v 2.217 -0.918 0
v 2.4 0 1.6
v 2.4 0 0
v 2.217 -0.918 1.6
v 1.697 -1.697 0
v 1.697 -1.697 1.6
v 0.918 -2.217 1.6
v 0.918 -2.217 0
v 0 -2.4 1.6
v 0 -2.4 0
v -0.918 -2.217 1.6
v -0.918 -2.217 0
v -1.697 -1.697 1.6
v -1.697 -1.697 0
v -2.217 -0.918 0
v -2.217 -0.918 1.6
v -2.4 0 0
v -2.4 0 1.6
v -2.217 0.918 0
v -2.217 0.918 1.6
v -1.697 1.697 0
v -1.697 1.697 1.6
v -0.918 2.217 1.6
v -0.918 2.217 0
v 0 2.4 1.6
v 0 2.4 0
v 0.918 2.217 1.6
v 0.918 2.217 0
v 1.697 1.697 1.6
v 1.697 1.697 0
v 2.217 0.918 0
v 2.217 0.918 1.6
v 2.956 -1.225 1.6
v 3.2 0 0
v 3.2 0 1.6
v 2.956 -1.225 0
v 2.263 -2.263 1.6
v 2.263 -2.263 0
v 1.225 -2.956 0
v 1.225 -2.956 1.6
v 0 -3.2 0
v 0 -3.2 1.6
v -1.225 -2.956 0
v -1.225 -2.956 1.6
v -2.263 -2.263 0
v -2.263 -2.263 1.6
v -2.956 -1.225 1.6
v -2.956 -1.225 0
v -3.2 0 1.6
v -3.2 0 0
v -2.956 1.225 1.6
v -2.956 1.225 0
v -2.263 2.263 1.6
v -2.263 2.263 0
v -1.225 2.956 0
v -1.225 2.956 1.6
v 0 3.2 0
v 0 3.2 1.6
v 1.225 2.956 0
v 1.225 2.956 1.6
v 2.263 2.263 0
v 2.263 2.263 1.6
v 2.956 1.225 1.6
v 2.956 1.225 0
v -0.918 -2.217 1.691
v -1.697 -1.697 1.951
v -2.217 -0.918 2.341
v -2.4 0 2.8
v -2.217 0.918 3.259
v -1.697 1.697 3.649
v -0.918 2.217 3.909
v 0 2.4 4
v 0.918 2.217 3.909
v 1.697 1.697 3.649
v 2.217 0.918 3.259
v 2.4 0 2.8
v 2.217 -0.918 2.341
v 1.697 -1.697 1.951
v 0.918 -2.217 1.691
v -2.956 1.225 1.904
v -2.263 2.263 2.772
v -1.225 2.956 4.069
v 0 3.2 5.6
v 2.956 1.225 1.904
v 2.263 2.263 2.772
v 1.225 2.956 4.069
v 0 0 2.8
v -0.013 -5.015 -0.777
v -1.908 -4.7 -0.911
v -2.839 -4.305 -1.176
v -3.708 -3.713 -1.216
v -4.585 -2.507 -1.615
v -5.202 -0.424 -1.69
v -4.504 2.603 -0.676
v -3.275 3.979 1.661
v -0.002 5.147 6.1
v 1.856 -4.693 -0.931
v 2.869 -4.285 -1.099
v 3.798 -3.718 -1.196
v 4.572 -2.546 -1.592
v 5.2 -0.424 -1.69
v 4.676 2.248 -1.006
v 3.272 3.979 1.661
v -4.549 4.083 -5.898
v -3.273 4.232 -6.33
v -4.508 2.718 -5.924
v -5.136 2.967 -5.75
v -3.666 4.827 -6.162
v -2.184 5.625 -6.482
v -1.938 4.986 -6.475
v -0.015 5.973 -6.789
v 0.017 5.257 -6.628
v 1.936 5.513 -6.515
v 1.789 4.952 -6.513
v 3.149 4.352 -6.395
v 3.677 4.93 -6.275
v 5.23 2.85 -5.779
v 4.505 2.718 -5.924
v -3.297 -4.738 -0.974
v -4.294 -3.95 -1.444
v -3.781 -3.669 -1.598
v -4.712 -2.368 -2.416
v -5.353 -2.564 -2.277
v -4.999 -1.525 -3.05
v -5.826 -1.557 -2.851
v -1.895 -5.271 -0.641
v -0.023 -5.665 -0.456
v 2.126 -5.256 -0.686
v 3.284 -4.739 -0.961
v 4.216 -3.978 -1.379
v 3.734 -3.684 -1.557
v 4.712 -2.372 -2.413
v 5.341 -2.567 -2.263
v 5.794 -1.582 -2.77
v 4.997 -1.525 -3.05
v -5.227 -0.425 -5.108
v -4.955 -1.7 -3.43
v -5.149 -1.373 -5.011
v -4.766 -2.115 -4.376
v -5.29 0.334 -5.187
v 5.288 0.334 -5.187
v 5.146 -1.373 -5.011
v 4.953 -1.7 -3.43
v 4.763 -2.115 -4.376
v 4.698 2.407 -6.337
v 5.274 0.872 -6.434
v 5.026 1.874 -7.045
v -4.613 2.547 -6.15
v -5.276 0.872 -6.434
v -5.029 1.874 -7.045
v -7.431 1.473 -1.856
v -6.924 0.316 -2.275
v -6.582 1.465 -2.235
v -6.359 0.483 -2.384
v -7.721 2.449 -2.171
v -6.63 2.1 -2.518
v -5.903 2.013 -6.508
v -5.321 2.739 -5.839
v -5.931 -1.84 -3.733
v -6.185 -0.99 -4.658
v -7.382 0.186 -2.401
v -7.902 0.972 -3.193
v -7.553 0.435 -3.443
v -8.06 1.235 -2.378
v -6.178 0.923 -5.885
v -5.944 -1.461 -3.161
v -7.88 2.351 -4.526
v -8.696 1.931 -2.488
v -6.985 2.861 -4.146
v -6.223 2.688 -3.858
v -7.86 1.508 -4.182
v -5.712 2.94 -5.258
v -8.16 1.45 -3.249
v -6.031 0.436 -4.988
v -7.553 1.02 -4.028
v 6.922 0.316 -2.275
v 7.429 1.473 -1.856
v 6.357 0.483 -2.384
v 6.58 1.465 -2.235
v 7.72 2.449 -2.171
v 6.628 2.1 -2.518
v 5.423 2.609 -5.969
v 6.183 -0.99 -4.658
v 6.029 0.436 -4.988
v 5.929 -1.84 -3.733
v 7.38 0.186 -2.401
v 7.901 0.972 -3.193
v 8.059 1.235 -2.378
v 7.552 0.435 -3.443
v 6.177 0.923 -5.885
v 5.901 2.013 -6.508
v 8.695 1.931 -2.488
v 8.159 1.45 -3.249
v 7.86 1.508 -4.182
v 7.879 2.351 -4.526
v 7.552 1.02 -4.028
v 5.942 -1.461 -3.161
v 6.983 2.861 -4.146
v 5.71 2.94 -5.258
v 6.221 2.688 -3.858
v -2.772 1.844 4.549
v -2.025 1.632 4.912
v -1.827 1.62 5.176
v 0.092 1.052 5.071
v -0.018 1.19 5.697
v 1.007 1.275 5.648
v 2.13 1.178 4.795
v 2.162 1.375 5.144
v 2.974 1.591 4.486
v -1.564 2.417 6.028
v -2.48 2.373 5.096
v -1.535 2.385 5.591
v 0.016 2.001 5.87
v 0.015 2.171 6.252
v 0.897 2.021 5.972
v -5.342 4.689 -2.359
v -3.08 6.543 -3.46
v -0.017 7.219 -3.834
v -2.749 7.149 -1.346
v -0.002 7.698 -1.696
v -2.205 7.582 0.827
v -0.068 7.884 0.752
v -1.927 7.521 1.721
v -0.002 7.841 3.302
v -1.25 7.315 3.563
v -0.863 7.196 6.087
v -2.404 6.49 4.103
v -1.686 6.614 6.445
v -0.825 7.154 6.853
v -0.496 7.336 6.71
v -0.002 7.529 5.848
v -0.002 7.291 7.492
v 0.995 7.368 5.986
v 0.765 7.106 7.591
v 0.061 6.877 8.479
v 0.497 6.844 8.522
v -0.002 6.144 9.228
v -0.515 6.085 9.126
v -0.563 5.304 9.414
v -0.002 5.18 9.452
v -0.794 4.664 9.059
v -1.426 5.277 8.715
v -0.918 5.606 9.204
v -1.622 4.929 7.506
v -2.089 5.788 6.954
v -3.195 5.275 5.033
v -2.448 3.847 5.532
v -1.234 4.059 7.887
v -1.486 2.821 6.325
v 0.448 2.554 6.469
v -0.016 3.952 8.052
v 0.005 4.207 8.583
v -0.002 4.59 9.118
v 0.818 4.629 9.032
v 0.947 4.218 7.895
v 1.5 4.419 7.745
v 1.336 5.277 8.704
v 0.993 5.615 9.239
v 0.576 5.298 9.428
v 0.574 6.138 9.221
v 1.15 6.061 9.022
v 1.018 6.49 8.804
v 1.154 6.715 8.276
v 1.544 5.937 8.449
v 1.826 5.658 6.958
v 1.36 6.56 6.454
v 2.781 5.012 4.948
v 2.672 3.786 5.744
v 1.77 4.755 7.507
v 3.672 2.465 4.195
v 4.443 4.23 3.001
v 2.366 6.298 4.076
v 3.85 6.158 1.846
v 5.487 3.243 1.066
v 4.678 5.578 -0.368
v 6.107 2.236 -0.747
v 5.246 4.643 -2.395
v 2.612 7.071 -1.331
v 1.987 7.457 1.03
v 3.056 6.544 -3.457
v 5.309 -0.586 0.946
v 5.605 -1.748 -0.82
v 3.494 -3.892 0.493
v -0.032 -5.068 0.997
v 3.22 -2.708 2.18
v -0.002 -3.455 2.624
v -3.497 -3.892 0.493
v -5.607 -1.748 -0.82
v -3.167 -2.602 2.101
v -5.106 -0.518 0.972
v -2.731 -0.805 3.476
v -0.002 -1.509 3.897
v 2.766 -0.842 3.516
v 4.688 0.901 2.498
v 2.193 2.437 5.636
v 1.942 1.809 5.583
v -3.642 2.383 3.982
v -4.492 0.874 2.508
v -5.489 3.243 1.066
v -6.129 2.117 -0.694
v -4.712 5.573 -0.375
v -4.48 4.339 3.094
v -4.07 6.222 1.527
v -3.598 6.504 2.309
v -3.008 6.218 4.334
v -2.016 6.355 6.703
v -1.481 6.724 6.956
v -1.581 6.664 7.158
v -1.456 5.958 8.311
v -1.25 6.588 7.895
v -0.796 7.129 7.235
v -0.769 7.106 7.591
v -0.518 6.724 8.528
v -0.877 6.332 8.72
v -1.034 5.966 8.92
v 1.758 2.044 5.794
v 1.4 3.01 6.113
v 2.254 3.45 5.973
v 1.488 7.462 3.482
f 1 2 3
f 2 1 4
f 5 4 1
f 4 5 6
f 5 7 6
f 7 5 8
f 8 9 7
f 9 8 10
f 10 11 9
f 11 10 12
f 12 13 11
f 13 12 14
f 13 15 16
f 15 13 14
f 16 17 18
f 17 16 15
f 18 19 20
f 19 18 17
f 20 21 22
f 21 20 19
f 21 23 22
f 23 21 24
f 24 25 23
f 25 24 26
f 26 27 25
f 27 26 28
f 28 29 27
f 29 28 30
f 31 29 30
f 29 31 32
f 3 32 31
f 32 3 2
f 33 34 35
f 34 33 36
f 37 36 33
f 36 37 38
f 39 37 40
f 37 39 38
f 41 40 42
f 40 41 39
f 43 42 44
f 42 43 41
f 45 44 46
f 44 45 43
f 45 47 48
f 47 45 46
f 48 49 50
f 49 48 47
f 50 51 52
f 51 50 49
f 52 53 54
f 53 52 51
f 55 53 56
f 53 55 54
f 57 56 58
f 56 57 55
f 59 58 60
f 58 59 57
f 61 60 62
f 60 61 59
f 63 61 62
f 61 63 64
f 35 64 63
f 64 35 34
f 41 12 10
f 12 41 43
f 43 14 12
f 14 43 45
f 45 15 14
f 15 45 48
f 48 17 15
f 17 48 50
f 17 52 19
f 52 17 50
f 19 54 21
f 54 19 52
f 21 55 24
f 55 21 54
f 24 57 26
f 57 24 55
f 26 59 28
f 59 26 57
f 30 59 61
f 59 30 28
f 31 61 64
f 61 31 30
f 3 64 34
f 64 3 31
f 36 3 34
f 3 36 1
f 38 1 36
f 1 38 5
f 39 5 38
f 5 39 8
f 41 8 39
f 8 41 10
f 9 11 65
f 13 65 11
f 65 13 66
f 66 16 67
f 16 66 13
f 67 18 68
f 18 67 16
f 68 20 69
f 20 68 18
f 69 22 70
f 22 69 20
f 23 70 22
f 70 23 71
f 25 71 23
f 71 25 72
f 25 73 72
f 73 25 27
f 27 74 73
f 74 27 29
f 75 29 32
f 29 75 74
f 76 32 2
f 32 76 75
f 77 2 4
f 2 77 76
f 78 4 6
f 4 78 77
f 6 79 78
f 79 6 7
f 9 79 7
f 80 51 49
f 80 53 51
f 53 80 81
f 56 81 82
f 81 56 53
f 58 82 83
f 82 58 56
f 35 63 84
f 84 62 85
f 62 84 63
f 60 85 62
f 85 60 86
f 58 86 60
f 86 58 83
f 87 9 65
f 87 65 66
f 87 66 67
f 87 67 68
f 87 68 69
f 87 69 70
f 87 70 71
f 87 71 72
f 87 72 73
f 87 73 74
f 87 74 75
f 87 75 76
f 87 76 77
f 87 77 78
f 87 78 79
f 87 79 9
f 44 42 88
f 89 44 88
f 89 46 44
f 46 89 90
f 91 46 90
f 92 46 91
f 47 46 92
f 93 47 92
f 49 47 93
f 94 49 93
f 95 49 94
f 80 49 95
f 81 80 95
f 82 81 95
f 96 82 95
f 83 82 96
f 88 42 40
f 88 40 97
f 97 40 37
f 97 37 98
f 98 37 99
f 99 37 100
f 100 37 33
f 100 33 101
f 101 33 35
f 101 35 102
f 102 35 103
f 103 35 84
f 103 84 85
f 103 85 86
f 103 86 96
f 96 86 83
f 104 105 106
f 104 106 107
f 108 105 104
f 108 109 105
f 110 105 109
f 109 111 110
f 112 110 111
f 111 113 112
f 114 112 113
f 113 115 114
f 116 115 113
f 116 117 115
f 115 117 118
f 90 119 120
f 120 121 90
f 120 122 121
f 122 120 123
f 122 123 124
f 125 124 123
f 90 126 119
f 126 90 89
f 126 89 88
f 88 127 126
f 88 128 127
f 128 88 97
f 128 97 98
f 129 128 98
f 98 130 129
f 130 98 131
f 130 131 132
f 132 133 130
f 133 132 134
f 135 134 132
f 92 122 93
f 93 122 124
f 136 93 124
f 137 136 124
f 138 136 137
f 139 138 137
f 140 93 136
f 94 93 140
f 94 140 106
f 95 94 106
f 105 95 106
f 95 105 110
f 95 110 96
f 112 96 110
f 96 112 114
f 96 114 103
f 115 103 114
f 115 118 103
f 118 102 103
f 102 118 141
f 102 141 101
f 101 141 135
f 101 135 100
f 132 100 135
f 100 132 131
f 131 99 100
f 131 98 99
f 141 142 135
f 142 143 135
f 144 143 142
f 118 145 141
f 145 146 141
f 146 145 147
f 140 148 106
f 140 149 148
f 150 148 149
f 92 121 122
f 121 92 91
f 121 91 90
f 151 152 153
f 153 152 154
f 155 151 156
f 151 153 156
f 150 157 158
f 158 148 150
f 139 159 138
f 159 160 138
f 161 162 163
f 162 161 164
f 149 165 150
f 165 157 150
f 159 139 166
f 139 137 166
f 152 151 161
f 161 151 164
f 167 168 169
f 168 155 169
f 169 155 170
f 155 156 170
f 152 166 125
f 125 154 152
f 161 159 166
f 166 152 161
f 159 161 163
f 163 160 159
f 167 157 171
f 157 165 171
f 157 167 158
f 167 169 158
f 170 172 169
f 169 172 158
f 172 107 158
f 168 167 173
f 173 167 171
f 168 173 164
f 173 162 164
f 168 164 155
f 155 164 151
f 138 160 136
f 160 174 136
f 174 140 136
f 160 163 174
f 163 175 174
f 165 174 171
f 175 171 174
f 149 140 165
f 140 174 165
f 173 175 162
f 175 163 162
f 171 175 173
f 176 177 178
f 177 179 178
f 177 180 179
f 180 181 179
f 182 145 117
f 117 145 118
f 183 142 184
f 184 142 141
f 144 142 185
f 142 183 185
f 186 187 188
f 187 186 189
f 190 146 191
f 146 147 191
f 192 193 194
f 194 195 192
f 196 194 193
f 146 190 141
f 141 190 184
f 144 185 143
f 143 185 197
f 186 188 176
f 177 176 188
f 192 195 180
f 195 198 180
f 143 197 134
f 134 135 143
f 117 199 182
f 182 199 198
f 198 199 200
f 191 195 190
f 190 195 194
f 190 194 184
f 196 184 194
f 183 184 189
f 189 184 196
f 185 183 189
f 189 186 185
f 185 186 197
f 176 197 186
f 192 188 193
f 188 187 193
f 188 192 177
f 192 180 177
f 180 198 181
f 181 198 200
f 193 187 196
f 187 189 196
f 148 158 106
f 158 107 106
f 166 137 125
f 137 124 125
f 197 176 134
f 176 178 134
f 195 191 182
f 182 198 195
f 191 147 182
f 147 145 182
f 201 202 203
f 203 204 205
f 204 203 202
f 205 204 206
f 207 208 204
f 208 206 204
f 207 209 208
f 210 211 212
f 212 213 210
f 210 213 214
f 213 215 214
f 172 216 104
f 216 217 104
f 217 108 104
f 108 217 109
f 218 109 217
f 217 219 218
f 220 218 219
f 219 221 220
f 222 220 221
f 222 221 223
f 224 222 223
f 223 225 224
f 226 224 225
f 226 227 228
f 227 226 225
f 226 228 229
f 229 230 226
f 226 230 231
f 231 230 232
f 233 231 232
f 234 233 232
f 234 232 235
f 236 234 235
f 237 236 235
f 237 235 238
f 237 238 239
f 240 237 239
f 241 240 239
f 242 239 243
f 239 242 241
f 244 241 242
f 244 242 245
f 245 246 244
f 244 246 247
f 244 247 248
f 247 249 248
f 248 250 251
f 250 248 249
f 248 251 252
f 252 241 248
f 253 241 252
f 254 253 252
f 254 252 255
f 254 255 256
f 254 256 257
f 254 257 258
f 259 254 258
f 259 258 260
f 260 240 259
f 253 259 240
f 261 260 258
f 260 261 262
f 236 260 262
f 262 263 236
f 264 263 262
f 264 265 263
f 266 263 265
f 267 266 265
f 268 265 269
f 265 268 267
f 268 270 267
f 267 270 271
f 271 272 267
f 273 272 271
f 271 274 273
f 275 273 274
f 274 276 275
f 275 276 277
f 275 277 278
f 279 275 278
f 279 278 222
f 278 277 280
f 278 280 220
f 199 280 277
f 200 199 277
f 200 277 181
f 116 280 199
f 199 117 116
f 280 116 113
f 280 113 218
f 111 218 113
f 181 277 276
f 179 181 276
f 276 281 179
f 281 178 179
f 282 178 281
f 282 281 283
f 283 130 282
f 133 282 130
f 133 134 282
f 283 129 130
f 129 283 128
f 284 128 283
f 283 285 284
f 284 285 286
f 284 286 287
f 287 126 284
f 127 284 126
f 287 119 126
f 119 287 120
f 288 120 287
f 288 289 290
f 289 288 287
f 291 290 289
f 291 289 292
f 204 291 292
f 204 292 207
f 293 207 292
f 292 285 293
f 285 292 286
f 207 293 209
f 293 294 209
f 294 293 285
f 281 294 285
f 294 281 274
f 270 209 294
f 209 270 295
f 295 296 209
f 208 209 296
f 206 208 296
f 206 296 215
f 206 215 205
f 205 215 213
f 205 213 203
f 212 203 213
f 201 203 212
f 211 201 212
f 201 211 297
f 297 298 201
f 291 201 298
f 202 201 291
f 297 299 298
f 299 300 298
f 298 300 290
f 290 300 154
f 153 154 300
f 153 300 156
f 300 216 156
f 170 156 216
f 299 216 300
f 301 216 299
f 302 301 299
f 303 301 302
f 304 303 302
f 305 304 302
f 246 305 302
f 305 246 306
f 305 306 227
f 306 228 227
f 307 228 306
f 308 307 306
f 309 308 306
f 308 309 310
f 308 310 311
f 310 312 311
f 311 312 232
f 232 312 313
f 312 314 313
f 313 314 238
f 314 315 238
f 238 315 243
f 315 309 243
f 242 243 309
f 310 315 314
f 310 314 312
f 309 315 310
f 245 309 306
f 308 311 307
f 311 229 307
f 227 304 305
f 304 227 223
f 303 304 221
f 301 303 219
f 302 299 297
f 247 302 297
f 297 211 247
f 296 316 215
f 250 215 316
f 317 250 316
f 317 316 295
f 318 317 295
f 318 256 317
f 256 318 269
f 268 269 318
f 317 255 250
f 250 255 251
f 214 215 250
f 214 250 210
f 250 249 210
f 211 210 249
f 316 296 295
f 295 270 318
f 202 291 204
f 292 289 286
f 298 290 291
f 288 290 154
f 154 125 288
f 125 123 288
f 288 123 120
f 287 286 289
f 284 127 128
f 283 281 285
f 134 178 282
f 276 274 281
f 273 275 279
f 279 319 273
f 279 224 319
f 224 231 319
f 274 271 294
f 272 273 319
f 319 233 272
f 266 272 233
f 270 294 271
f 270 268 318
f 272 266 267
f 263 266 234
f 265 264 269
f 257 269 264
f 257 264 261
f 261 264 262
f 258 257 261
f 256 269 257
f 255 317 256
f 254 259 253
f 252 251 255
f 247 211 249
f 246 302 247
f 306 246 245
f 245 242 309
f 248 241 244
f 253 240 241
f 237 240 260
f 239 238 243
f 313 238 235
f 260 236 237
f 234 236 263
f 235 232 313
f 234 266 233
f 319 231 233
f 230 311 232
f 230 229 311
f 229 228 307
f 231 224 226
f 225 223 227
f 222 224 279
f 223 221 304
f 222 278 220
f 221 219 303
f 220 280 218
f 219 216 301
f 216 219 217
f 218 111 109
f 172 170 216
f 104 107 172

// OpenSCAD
use <../lib.scad>
use <s/13787s01.scad>
use <s/13787s02.scad>
$fa=1; $fs=0.2;
function ldraw_lib__13787p03(realsolid=false) = [
// 0 Minifig Hat Elf with Pointy Ears with Dark Pink Top Pattern
// 0 Name: 13787p03.dat
// 0 Author: Vincent Messenet [Cheenzo]
// 0 !LDRAW_ORG Part UPDATE 2022-06
// 0 !LICENSE Licensed under CC BY 2.0 and CC BY 4.0 : see CAreadme.txt
// 
// 0 BFC CERTIFY CCW
  [0,"BFC","CERTIFY"],
  [0,"BFC","CCW"],
// 
// 0 !CATEGORY Minifig Headwear
// 0 !KEYWORDS BAM, Bricklink 13787pb03, Christmas, Holiday
// 
// 0 !HISTORY 2022-10-14 [Cheenzo] Based on 13787p01 by Philo
// 0 !HISTORY 2022-12-20 [PTadmin] Official Update 2022-06
// 
// 
// 1 16 0 0 0 1 0 0 0 1 0 0 0 1 s\13787s01.dat
  [1,16,0,0,0,1,0,0,0,1,0,0,0,1, ldraw_lib__s__13787s01(realsolid)],
// 1 5 0 0 0 1 0 0 0 1 0 0 0 1 s\13787s02.dat
  [1,5,0,0,0,1,0,0,0,1,0,0,0,1, ldraw_lib__s__13787s02(realsolid)],
];
module ldraw_lib__13787p03(step=0, col=false, unit=2/5, alt=false, line=0.2, solid=!$preview)
    makepoly(ldraw_lib__13787p03(solid), step=step, col=col, unit=unit, alt=alt, line=line, solid=solid);
ldraw_lib__13787p03(line=0.2);
